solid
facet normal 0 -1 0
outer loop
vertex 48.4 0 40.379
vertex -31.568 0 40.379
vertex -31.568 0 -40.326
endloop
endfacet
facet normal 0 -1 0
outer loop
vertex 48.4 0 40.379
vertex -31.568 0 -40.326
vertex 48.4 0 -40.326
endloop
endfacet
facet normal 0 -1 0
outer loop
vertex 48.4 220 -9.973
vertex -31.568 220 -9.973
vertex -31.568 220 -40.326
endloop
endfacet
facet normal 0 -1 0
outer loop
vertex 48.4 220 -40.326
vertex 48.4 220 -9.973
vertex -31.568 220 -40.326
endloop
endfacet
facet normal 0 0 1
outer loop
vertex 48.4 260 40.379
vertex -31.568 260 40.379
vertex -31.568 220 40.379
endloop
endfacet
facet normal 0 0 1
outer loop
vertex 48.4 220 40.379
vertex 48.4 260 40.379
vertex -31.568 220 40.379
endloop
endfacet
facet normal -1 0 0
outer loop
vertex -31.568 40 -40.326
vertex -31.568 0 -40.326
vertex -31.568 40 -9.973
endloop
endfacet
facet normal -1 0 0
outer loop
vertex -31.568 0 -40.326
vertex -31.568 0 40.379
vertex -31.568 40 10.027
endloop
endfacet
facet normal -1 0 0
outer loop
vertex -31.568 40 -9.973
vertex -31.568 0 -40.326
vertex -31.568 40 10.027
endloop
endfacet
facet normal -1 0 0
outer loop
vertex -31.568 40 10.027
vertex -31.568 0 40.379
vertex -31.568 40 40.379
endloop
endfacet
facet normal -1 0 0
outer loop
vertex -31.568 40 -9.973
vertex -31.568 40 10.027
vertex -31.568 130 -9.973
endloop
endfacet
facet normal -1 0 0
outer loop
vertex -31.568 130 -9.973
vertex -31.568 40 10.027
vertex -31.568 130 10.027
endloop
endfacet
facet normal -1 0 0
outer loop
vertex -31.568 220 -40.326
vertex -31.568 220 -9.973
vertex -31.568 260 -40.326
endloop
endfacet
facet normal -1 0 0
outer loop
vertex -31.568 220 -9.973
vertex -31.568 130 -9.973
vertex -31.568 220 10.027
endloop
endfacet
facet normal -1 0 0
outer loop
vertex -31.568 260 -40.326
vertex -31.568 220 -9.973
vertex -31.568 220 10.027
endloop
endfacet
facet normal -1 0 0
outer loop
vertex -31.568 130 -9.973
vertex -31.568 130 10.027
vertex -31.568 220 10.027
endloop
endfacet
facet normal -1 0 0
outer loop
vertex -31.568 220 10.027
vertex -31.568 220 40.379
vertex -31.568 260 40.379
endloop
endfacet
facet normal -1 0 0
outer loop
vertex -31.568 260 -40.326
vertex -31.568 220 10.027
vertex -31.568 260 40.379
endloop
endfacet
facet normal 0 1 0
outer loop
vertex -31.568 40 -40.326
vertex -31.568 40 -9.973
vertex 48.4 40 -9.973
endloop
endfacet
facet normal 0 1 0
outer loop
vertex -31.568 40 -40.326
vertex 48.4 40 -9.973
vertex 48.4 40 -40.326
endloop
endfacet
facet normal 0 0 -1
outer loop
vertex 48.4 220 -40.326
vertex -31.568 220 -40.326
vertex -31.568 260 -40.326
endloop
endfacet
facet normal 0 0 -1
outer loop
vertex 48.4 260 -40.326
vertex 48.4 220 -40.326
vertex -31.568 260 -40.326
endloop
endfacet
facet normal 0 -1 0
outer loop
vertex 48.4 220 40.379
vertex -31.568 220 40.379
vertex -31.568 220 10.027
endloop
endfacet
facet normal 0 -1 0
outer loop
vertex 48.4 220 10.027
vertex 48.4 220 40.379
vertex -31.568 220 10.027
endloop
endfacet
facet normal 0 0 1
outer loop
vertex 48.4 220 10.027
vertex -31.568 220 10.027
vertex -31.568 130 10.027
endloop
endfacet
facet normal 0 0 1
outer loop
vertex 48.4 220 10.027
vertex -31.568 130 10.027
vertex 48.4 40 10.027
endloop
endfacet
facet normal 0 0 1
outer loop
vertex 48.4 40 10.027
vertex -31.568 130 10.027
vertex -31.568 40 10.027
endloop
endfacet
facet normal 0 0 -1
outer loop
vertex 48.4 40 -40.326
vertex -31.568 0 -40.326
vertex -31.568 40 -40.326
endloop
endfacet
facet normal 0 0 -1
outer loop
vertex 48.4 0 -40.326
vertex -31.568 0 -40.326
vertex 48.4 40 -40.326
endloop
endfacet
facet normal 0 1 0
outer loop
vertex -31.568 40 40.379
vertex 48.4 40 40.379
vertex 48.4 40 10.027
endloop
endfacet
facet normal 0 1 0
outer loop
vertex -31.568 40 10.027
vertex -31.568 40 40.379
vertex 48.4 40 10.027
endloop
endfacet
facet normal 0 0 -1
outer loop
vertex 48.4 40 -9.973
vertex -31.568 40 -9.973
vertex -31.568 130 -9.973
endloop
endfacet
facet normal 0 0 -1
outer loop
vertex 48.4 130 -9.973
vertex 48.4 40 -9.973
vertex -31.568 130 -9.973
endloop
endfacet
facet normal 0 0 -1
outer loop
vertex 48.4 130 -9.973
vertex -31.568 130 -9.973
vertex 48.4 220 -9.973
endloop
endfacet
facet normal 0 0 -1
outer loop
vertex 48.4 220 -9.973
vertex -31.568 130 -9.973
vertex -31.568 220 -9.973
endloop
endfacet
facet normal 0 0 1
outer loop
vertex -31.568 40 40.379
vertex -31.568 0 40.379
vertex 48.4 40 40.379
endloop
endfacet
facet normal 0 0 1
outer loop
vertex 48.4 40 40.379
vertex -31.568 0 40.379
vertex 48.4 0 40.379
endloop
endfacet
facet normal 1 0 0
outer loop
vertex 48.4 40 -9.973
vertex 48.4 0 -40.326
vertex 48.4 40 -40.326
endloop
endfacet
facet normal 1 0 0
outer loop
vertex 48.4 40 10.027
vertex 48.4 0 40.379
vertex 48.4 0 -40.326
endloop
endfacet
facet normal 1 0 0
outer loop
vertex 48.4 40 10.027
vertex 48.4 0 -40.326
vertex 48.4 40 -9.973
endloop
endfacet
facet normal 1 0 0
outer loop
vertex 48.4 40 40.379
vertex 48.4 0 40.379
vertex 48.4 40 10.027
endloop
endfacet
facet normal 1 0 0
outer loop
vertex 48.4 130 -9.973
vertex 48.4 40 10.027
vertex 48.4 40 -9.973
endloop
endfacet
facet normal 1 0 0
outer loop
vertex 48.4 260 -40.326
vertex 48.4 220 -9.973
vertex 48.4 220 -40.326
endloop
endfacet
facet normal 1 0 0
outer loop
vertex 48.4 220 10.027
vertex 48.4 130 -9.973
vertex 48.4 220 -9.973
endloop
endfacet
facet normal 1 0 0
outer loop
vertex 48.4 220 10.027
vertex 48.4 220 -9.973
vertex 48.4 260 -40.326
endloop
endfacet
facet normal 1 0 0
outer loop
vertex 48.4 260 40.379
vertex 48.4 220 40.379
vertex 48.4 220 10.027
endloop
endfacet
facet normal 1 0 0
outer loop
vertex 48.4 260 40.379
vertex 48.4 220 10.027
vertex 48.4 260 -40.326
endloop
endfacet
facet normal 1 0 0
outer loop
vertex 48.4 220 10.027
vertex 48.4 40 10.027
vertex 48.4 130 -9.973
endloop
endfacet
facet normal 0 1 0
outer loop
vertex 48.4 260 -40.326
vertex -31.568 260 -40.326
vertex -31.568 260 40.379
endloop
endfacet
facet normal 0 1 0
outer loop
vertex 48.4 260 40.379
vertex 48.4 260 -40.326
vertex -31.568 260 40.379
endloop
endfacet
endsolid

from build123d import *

# Parameters (mm, degrees)
SKETCH1_W           = 79.968077757
SKETCH1_H           = 80.704842411
BOSS_EXTRUDE1_DEPTH = 130
SKETCH2_W           = 30.352421206
SKETCH2_H           = 320
SKETCH2_W_2         = 30.352421205
CUT_EXTRUDE1_DEPTH  = 80
MIRROR3_START       = -31.568063376
MIRROR3_DEPTH       = 79.968077757


# Read off the part's stored shape, not the designer's step: Mirror3
with BuildPart() as part:
    # Sketch1 → Boss-Extrude1 (new body)
    with BuildSketch(Plane(origin=(0, 0, 0), x_dir=(1, 0, 0), z_dir=(0, 1, 0))):
        with Locations((8.415975503, -0.026706735)):
            Rectangle(SKETCH1_W, SKETCH1_H)
    extrude(amount=BOSS_EXTRUDE1_DEPTH)

    # Sketch2 → Cut-Extrude1 (cut)
    with BuildSketch(Plane(origin=(48.400014381, 0, 0), x_dir=(0, 0, -1), z_dir=(1, 0, 0))):
        with Locations((-25.202917338, 200)):
            Rectangle(SKETCH2_W, SKETCH2_H)
        with Locations((25.149503868, 200)):
            Rectangle(SKETCH2_W_2, SKETCH2_H)
    extrude(amount=-CUT_EXTRUDE1_DEPTH, mode=Mode.SUBTRACT)

    # Mirror3 outline → Mirror3 (add)
    with BuildSketch(Plane.YZ.offset(MIRROR3_START)):
        Polygon((220, -40.32571447), (260, -40.32571447), (260, 40.379127941), (220, 40.379127941), (220, 10.026706735), (130, 10.026706735), (130, -9.973293265), (220, -9.973293265), align=None)
    extrude(amount=MIRROR3_DEPTH)


solid = part.part
